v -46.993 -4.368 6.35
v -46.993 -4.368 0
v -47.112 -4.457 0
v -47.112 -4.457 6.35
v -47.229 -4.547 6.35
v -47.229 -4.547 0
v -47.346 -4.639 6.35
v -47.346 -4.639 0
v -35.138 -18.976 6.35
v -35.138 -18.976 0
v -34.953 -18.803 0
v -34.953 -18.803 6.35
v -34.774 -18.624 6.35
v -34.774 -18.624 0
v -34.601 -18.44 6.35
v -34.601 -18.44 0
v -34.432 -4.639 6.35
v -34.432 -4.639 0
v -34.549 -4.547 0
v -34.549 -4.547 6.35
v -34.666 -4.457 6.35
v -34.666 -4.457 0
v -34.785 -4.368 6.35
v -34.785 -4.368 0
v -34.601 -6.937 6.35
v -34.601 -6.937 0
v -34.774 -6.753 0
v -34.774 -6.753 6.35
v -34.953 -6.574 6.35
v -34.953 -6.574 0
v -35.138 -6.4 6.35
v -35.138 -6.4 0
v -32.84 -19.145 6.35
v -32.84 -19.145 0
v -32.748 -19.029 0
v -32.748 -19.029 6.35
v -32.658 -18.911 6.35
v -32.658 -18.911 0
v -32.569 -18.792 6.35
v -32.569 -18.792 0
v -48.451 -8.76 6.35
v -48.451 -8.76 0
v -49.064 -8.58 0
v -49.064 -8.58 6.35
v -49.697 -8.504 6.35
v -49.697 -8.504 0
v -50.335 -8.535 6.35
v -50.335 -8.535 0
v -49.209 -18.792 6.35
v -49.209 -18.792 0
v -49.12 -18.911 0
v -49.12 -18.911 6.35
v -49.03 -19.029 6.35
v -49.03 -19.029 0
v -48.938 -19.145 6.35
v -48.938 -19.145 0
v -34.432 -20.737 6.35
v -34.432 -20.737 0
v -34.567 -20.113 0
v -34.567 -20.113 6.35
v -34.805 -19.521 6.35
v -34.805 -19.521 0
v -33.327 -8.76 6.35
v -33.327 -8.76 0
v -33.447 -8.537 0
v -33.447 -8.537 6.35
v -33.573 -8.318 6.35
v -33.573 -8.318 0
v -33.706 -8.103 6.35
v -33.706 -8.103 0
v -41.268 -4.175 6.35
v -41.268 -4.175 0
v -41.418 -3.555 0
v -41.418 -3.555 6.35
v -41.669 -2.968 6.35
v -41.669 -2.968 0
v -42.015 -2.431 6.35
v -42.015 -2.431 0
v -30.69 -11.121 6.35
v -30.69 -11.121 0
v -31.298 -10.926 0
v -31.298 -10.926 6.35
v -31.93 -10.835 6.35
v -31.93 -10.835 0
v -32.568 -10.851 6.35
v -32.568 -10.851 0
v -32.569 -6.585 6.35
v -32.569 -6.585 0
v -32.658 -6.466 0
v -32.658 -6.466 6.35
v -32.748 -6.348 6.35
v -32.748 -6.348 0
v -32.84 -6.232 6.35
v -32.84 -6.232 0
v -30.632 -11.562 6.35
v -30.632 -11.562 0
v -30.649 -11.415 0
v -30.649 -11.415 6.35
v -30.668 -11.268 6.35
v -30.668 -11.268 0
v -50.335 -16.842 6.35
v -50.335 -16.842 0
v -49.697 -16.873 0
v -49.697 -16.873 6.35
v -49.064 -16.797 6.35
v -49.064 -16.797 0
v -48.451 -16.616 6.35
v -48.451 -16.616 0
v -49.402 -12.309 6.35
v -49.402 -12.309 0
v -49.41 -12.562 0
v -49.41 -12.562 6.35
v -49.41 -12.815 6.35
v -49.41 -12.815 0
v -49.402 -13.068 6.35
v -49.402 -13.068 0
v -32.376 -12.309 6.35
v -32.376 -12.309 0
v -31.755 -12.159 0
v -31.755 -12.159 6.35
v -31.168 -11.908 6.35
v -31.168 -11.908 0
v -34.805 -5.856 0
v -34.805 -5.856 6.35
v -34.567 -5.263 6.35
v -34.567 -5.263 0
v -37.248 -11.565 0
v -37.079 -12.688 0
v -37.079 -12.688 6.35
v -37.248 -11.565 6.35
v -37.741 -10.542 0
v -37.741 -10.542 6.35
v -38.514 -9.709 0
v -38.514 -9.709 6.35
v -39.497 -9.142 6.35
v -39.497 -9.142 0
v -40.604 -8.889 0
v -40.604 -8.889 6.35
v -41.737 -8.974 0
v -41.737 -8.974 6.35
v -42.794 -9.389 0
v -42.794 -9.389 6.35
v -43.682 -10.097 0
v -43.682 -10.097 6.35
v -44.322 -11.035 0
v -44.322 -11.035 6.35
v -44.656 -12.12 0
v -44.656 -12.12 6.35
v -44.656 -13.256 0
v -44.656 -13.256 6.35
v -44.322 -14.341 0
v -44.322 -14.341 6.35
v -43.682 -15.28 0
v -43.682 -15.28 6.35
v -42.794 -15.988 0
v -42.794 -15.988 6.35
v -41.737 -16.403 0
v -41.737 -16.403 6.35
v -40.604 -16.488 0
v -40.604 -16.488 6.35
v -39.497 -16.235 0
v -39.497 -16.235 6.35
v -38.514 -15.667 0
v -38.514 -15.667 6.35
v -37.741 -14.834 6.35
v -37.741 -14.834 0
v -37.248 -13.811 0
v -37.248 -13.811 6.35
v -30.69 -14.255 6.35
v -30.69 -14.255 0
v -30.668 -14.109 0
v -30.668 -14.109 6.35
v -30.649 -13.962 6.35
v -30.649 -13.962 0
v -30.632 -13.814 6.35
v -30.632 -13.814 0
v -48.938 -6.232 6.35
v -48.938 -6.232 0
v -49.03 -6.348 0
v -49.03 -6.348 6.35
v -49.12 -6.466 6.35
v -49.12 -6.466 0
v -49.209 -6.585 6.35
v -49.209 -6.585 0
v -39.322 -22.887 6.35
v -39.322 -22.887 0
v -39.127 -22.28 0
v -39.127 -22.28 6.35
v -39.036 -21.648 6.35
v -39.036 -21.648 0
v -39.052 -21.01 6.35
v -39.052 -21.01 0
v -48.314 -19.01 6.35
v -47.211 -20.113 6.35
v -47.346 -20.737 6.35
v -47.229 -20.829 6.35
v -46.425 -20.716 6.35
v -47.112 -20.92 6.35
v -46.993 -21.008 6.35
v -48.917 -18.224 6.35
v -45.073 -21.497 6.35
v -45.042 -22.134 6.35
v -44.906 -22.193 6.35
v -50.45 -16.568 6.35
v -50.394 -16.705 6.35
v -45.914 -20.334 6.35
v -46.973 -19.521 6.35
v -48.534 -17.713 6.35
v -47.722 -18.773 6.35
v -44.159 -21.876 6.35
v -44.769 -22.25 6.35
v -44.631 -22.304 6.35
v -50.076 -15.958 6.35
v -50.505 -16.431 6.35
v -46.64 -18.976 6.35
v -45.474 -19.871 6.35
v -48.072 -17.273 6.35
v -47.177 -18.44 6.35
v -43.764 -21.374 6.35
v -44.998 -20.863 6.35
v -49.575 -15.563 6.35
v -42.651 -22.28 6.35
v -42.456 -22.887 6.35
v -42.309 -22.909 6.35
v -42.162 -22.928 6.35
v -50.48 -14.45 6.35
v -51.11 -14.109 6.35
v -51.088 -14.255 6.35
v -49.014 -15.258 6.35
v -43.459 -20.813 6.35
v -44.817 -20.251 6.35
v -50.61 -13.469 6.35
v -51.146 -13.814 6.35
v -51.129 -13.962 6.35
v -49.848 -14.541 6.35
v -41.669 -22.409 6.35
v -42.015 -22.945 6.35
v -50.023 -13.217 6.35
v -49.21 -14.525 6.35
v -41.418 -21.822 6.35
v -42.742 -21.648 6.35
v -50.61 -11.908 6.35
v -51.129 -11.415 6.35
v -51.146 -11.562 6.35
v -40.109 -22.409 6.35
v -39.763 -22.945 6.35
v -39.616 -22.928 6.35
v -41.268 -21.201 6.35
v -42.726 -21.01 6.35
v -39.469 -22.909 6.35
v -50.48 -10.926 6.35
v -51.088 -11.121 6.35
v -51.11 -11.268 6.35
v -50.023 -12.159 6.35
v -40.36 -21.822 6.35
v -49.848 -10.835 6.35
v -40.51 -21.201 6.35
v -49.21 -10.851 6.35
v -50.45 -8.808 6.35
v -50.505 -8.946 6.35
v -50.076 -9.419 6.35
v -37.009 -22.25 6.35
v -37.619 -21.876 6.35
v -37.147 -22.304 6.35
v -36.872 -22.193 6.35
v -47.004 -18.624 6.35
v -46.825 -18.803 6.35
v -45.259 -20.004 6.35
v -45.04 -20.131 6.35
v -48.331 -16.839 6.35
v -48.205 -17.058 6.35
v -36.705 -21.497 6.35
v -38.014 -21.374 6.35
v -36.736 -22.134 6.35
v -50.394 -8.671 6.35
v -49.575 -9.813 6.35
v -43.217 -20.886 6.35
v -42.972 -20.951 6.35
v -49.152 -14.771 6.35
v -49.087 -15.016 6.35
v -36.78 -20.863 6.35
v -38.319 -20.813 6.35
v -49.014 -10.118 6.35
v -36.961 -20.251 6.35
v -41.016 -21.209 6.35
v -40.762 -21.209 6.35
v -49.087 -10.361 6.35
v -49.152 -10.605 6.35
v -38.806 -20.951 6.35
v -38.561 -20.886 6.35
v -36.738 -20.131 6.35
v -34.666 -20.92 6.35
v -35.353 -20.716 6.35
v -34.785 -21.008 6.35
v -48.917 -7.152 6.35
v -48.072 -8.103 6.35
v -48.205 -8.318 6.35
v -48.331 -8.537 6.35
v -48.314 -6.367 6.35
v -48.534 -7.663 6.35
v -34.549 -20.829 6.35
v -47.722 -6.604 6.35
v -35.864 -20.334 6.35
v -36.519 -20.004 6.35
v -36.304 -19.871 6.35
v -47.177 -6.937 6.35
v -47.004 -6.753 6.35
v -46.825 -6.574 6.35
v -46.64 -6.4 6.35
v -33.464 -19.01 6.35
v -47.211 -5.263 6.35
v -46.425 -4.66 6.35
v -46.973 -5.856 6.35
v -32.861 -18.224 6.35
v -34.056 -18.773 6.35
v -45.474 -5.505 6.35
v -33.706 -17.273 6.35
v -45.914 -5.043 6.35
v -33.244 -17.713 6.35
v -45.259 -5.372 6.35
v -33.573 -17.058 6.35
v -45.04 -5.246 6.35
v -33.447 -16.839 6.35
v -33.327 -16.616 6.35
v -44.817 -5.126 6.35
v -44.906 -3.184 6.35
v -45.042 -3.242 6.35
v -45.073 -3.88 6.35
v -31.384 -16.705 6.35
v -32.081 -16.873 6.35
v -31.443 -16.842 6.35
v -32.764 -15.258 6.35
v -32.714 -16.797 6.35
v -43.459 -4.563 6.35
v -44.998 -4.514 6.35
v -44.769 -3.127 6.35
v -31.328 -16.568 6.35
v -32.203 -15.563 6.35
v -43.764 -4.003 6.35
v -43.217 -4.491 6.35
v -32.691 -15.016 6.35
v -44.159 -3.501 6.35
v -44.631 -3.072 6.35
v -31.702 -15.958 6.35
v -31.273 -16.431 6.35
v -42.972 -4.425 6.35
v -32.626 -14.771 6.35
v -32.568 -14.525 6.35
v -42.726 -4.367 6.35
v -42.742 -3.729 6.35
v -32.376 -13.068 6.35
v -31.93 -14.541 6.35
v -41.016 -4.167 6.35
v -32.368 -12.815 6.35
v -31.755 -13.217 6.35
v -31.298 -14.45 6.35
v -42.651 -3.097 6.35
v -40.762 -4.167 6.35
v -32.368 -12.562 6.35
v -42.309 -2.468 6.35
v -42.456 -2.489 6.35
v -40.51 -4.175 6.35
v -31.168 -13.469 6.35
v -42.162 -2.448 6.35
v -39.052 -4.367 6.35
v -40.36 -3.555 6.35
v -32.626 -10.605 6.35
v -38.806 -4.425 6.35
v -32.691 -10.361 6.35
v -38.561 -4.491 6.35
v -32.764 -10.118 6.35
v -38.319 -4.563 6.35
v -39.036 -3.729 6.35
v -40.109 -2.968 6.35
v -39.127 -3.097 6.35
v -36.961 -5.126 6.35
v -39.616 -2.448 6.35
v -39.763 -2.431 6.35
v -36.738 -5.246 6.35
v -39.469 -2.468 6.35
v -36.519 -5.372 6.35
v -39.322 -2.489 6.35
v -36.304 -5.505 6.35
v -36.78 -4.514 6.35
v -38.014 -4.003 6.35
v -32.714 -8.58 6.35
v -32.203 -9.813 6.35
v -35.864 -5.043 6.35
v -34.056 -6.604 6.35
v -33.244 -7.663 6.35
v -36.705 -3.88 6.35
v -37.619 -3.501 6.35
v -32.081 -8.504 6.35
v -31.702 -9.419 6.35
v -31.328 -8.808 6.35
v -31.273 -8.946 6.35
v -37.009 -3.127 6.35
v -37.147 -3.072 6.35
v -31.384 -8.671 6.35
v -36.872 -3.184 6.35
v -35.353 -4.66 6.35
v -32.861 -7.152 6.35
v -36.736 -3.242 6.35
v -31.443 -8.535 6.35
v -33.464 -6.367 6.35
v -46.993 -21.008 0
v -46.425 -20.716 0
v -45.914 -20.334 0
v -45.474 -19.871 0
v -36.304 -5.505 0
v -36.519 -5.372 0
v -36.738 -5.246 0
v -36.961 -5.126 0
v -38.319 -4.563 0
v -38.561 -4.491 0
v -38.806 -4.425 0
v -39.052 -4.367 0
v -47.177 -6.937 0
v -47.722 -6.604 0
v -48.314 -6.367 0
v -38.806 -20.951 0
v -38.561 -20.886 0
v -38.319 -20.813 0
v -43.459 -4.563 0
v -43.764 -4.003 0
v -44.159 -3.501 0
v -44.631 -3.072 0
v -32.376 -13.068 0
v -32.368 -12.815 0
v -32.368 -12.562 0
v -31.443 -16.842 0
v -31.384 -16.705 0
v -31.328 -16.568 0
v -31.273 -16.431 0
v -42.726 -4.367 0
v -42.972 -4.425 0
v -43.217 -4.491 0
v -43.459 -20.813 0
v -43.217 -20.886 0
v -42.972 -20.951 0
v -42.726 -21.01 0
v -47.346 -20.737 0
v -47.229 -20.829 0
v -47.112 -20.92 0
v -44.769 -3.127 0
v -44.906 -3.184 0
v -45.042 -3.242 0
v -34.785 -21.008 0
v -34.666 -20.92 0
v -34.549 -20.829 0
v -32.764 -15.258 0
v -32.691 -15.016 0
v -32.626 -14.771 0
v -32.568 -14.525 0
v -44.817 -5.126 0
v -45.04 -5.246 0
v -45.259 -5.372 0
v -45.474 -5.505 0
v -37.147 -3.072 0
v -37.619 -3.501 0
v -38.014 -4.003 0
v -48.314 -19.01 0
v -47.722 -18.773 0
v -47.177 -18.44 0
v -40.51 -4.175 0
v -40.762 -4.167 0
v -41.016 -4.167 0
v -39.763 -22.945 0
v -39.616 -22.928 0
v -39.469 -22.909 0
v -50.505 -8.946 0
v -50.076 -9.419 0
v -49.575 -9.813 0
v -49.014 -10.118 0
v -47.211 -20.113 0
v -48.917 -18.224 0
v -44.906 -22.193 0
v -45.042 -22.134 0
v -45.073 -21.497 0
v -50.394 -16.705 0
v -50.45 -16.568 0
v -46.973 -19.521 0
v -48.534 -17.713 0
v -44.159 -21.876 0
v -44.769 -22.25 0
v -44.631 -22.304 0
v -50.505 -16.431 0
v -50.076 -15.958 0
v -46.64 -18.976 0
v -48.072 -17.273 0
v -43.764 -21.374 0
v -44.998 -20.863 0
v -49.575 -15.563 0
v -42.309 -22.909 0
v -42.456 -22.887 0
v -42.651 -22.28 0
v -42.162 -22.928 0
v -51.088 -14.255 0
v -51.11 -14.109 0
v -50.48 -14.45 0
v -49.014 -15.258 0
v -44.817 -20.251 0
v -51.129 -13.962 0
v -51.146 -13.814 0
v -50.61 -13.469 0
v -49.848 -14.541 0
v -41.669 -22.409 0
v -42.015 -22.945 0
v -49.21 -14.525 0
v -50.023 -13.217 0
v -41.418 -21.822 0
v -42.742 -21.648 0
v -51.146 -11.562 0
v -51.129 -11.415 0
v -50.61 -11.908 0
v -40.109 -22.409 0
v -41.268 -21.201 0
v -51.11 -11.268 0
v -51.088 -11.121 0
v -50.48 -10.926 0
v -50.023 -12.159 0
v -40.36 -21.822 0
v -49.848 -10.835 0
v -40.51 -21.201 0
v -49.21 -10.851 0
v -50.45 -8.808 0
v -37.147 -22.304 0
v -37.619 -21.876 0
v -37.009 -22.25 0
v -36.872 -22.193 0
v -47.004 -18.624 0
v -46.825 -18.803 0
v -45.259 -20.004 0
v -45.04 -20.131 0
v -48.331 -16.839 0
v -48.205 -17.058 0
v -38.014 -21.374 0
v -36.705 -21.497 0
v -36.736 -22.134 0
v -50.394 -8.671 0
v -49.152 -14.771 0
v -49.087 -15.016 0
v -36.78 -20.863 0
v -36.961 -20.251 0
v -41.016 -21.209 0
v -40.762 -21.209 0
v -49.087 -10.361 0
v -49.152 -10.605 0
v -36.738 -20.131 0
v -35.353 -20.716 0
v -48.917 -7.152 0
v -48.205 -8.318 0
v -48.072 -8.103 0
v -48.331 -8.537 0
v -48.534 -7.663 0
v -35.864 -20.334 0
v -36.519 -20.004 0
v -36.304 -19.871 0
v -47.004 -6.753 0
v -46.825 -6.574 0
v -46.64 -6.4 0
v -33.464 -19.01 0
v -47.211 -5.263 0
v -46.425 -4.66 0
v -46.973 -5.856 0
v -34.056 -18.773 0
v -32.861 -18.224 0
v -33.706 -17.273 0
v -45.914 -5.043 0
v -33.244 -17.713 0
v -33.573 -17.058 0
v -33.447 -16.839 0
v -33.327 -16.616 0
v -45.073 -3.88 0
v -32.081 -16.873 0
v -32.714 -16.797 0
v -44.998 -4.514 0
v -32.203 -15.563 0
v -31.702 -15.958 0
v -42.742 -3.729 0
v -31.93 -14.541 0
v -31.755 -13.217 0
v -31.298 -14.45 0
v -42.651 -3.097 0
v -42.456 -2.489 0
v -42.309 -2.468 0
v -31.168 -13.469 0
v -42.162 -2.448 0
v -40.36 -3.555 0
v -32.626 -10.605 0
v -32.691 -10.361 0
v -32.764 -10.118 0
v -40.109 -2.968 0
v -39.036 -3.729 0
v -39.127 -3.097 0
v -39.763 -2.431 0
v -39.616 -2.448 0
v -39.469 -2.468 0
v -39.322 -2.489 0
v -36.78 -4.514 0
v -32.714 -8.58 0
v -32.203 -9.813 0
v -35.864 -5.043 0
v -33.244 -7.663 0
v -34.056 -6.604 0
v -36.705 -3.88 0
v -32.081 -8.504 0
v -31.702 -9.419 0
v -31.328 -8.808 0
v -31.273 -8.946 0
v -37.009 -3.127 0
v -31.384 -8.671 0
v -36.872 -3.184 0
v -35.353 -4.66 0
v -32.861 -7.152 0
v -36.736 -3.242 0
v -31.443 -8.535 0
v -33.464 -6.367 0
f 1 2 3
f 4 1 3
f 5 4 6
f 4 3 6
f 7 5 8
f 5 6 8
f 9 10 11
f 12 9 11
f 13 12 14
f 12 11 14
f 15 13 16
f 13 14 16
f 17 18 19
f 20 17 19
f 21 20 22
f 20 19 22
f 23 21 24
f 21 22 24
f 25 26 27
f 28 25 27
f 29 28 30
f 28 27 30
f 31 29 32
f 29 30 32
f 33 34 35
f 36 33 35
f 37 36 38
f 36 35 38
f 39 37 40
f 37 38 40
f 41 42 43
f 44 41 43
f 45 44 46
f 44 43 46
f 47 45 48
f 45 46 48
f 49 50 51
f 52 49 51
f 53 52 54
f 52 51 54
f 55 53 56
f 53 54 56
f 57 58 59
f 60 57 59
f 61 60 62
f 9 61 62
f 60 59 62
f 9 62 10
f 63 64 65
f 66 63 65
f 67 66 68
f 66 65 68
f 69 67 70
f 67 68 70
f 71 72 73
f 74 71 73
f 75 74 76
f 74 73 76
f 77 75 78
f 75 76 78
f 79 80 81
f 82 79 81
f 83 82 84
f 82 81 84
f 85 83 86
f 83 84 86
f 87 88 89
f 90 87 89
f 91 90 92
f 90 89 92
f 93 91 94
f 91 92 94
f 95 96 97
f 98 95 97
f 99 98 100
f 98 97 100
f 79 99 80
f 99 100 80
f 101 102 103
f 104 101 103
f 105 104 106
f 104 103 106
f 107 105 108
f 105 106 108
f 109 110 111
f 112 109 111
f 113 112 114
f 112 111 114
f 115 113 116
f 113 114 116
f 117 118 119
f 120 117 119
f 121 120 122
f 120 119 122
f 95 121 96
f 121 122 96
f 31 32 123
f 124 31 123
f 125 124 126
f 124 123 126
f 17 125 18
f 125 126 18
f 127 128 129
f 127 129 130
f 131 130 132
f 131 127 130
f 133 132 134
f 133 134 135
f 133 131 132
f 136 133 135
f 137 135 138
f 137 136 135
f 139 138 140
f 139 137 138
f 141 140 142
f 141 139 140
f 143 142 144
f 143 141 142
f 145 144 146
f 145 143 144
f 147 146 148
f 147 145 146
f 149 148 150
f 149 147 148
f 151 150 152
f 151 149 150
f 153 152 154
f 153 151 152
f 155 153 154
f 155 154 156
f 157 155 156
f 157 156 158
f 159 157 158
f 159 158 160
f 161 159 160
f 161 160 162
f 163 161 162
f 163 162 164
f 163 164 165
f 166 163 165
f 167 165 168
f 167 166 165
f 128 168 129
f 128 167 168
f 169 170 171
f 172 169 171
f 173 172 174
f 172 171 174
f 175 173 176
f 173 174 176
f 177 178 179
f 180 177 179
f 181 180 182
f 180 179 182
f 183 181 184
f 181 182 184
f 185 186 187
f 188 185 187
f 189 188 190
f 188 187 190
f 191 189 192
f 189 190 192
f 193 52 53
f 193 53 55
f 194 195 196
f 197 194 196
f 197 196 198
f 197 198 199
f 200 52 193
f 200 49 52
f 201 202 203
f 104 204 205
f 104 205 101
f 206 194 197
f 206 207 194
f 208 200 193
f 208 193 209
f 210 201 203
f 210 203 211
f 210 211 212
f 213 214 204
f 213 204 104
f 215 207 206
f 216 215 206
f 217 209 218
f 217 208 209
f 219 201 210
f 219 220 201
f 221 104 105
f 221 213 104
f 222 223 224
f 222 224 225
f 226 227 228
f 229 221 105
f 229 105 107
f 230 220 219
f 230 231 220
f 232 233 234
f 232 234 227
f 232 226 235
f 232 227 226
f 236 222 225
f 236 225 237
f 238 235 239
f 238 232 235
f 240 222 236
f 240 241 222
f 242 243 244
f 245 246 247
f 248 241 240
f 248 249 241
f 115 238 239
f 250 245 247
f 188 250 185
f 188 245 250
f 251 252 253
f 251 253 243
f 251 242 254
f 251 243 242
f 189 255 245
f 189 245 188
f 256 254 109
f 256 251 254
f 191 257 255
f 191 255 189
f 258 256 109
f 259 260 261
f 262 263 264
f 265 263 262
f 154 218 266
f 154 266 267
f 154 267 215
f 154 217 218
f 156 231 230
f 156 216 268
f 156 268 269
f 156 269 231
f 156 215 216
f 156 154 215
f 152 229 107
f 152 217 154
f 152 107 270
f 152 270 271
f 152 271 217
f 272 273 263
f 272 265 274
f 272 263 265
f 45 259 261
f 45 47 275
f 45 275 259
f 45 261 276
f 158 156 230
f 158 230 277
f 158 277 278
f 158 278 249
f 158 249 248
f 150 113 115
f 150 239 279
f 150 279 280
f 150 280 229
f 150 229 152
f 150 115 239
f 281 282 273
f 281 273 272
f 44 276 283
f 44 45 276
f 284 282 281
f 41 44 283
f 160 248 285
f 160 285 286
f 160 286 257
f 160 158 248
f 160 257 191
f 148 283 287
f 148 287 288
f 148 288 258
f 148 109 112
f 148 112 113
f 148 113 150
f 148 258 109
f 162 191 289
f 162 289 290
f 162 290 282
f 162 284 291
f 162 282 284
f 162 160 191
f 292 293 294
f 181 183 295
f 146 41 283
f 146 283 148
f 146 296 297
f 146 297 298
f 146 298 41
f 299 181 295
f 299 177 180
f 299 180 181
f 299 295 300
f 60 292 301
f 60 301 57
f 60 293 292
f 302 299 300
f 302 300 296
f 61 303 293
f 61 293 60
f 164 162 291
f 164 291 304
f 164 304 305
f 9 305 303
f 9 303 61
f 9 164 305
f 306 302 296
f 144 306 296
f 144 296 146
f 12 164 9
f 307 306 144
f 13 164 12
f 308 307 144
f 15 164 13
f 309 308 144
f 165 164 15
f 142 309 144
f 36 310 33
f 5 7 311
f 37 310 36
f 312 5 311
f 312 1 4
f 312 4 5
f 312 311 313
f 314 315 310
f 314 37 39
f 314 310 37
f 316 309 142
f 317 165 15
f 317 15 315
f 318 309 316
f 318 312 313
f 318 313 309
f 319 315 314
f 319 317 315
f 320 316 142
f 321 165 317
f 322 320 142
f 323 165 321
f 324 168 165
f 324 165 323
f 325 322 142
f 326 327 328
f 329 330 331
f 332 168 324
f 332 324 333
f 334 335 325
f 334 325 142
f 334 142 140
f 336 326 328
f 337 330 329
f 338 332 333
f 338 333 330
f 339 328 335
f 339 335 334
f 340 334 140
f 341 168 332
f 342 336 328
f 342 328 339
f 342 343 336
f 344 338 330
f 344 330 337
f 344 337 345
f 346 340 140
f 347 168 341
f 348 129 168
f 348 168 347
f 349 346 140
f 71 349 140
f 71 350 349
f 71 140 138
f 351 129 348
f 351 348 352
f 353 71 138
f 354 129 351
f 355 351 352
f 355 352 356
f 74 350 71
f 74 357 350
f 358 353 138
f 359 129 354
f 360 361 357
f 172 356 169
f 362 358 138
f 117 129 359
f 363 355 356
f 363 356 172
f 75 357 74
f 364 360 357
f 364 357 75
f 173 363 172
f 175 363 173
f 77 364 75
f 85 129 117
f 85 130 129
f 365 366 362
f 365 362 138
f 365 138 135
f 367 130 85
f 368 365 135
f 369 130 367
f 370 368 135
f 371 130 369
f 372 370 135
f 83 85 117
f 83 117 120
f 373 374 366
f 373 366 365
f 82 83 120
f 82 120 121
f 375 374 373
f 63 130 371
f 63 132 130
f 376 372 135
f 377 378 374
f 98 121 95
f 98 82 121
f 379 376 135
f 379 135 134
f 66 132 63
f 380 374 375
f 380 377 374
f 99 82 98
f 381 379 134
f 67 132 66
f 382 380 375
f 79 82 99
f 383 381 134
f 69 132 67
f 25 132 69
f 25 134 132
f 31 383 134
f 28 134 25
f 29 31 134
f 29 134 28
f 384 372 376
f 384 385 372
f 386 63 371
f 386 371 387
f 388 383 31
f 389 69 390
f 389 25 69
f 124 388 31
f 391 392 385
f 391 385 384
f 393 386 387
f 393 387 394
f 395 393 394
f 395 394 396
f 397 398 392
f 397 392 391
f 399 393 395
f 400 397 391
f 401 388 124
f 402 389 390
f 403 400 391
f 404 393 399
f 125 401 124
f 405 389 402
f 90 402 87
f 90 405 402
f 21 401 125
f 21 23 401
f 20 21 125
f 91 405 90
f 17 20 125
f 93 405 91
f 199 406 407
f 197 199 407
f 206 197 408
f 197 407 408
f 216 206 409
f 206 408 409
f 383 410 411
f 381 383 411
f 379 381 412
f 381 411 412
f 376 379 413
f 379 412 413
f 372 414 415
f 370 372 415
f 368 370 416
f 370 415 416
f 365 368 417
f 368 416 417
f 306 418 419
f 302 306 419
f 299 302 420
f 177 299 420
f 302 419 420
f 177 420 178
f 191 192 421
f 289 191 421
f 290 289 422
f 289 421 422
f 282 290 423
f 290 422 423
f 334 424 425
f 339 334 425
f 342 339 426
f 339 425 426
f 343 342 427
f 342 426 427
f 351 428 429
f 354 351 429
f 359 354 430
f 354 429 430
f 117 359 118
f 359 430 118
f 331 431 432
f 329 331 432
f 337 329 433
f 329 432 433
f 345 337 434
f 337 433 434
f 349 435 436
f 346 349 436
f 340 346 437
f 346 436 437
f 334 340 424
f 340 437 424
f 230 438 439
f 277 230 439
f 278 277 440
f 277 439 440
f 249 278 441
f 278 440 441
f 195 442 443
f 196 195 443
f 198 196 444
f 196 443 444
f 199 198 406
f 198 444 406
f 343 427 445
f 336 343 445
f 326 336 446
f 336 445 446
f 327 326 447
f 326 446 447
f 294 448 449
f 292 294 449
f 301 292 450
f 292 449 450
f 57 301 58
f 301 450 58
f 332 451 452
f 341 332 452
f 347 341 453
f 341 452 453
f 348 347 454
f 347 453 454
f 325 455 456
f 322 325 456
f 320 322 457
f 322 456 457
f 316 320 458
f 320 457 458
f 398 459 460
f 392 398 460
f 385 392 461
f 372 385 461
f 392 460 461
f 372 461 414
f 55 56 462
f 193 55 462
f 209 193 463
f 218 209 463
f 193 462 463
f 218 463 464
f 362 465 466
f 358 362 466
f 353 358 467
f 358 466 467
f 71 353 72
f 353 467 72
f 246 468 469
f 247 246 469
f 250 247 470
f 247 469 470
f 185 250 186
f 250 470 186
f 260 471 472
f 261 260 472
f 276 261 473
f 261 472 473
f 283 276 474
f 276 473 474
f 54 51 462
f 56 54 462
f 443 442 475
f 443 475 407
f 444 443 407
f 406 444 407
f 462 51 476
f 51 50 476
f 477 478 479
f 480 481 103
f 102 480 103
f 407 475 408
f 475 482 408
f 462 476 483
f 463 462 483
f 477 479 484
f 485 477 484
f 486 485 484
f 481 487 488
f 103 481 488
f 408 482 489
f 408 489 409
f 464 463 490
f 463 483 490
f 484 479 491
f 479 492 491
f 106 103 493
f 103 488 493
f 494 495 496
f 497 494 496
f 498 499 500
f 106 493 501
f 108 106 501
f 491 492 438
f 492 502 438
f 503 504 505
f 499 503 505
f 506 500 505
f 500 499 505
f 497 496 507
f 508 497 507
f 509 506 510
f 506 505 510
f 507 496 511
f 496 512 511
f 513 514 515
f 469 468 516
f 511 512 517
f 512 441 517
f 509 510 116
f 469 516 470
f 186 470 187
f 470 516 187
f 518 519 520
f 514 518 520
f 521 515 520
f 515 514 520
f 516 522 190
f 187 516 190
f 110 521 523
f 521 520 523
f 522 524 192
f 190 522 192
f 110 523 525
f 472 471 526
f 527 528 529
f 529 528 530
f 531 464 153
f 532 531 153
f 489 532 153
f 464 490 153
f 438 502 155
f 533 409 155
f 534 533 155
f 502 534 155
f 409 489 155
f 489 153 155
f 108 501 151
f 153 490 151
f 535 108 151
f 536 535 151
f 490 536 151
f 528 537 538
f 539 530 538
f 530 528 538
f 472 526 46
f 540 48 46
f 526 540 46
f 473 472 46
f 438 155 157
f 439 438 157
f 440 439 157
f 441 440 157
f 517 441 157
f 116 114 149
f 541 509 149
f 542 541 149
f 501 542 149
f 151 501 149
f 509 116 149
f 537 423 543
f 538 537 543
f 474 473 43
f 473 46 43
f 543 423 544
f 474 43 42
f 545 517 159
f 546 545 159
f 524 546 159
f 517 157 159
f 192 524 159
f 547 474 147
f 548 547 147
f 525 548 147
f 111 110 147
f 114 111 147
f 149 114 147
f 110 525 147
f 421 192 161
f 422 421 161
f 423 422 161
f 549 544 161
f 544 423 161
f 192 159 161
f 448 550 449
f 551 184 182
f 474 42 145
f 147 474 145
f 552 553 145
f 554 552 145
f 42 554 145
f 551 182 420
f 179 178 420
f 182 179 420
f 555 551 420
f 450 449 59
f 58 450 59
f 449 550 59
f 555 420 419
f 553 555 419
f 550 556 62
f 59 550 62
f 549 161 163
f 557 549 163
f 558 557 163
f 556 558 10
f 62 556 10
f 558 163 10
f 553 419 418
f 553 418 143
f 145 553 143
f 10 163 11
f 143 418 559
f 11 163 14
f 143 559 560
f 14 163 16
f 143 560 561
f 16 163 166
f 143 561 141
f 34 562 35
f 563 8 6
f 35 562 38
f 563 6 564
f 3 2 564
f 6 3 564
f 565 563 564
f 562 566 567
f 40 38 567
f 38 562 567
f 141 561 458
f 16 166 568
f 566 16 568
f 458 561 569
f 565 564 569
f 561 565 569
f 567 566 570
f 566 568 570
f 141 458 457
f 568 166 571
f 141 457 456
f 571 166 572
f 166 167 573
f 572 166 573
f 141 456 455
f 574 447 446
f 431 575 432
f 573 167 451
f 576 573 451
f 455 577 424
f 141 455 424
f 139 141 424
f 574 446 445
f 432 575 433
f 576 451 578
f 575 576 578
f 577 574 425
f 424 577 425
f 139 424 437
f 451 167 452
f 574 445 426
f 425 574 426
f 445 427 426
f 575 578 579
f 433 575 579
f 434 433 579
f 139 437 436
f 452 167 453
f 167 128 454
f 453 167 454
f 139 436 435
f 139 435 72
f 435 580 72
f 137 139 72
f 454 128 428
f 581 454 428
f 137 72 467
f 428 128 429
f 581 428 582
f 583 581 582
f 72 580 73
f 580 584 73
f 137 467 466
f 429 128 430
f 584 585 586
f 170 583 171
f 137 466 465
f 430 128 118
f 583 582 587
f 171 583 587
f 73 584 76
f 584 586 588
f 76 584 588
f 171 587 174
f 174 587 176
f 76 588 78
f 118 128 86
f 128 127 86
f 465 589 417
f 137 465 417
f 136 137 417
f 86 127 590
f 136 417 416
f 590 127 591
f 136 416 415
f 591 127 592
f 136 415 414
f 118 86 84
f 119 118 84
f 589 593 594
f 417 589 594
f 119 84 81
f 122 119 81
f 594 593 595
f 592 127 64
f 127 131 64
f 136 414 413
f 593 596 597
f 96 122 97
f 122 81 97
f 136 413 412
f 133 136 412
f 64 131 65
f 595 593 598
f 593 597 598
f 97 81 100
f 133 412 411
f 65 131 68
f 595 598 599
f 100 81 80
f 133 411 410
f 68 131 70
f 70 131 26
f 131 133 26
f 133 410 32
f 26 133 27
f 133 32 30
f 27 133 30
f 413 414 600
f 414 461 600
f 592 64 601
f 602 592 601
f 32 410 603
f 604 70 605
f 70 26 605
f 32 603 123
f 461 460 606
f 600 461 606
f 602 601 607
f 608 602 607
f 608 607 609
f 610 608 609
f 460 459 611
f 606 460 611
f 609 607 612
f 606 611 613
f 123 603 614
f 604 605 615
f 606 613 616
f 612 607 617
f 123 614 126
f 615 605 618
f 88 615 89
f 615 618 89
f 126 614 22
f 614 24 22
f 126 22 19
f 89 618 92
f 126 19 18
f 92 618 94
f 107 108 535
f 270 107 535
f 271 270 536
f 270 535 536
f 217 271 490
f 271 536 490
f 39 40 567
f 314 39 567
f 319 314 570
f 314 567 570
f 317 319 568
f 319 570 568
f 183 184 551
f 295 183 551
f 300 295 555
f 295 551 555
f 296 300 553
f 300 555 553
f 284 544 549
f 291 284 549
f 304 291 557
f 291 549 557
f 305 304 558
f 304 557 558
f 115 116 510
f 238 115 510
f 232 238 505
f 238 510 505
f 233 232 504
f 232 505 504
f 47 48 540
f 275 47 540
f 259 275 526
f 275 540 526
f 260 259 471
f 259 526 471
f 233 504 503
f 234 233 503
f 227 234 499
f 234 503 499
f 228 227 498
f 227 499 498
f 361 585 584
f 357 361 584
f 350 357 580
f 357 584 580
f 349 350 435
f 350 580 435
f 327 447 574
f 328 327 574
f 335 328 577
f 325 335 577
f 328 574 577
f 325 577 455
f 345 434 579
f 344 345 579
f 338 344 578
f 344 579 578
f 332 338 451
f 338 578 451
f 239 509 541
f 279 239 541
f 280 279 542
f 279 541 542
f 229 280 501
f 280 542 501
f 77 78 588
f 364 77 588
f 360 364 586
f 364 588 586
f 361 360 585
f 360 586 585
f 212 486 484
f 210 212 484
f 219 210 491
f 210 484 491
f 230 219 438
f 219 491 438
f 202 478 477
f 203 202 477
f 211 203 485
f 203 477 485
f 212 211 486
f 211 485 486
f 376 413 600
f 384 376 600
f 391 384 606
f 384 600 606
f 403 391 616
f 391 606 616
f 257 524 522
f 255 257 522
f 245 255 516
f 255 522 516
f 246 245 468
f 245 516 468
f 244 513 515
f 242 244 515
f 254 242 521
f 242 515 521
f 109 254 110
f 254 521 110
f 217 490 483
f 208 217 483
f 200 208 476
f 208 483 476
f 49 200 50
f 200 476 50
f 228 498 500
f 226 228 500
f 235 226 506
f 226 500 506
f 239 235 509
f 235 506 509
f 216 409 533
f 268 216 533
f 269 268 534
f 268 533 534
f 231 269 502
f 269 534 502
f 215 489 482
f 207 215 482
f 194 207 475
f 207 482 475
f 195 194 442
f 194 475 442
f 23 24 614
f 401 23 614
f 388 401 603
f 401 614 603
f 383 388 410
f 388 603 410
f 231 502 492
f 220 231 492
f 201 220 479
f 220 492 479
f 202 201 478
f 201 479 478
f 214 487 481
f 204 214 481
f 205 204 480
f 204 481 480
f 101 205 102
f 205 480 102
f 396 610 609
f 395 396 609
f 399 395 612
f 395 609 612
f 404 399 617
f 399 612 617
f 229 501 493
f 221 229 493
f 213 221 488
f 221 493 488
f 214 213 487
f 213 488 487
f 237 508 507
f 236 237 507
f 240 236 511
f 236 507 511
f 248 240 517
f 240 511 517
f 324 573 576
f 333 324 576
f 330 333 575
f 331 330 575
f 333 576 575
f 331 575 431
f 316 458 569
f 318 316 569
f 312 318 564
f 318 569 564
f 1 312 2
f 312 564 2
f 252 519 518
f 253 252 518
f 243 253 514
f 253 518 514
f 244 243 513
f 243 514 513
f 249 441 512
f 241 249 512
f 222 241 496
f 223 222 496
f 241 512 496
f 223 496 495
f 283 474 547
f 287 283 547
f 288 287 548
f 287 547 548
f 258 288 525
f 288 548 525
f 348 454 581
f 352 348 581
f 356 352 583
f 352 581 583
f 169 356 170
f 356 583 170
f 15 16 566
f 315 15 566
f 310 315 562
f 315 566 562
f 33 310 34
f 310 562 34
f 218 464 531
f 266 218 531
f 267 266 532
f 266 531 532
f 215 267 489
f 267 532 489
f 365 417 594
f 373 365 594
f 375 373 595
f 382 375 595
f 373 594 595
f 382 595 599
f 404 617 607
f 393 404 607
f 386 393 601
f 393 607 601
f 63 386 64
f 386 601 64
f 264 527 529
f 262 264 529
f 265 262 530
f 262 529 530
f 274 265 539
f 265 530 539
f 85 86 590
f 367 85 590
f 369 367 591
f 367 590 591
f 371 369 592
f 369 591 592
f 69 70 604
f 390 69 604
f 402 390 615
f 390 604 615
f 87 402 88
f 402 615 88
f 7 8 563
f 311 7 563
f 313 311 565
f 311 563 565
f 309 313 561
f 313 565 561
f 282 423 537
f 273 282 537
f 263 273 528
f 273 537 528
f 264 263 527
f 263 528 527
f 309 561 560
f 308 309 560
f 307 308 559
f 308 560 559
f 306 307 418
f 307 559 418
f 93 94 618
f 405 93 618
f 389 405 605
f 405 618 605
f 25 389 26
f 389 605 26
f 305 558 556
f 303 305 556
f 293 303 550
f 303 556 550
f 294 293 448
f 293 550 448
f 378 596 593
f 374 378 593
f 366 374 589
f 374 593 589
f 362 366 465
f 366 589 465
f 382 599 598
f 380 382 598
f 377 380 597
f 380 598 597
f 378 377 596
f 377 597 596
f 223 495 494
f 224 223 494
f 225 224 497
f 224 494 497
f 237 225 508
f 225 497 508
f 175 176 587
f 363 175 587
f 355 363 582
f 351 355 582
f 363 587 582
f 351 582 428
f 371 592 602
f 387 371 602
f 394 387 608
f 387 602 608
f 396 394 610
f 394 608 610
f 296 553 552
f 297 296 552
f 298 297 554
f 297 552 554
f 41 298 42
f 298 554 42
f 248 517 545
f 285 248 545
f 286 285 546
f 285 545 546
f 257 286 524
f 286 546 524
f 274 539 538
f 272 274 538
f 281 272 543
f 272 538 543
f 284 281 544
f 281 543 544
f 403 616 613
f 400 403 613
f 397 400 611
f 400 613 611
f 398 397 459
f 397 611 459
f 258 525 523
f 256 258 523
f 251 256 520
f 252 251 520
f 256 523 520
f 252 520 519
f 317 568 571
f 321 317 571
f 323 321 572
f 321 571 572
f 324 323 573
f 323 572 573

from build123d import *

# Parameters (mm, degrees)
SKETCH2_R           = 3.81
BOSS_EXTRUDE1_DEPTH = 6.35


with BuildPart() as part:
    # Sketch2 → Boss-Extrude1 (new body)
    with BuildSketch(Plane.XY):
        with BuildLine():
            ThreePointArc((-42.015017319, -22.945367918), (-41.531469039, -22.120633406), (-41.268457962, -21.20148645))
            ThreePointArc((-41.268457962, -21.20148645), (-40.889005651, -21.209938725), (-40.50955334, -21.20148645))
            ThreePointArc((-40.50955334, -21.20148645), (-40.246542262, -22.120633406), (-39.762993983, -22.945367918))
            ThreePointArc((-39.762993983, -22.945367918), (-39.542138505, -22.918710388), (-39.321909019, -22.887297981))
            ThreePointArc((-39.321909019, -22.887297981), (-39.068294246, -21.965514112), (-39.052137791, -21.009614053))
            ThreePointArc((-39.052137791, -21.009614053), (-38.683427394, -20.919568839), (-38.319092217, -20.813195084))
            ThreePointArc((-38.319092217, -20.813195084), (-37.827150287, -21.632950591), (-37.146621516, -22.304431452))
            ThreePointArc((-37.146621516, -22.304431452), (-36.940190983, -22.221520651), (-36.735595764, -22.13417901))
            ThreePointArc((-36.735595764, -22.13417901), (-36.729197926, -21.178163832), (-36.960997129, -20.250653679))
            ThreePointArc((-36.960997129, -20.250653679), (-36.628155651, -20.068247408), (-36.303766447, -19.871201369))
            ThreePointArc((-36.303766447, -19.871201369), (-35.616418695, -20.535700443), (-34.785286345, -21.008167342))
            ThreePointArc((-34.785286345, -21.008167342), (-34.607348655, -20.874653505), (-34.432330529, -20.737334819))
            ThreePointArc((-34.432330529, -20.737334819), (-34.673585627, -19.812239186), (-35.137543756, -18.976327224))
            ThreePointArc((-35.137543756, -18.976327224), (-34.863253794, -18.713990582), (-34.600917152, -18.43970062))
            ThreePointArc((-34.600917152, -18.43970062), (-33.76500519, -18.903658748), (-32.839909556, -19.144913847))
            ThreePointArc((-32.839909556, -19.144913847), (-32.702590871, -18.969895721), (-32.569077034, -18.791958031))
            ThreePointArc((-32.569077034, -18.791958031), (-33.041543932, -17.960825681), (-33.706043007, -17.273477928))
            ThreePointArc((-33.706043007, -17.273477928), (-33.508996967, -16.949088725), (-33.326590697, -16.616247247))
            ThreePointArc((-33.326590697, -16.616247247), (-32.399080544, -16.84804645), (-31.443065365, -16.841648612))
            ThreePointArc((-31.443065365, -16.841648612), (-31.355723725, -16.637053393), (-31.272812924, -16.430622859))
            ThreePointArc((-31.272812924, -16.430622859), (-31.944293785, -15.750094089), (-32.764049292, -15.258152159))
            ThreePointArc((-32.764049292, -15.258152159), (-32.657675537, -14.893816982), (-32.567630323, -14.525106585))
            ThreePointArc((-32.567630323, -14.525106585), (-31.611730264, -14.50895013), (-30.689946395, -14.255335357))
            ThreePointArc((-30.689946395, -14.255335357), (-30.658533987, -14.035105871), (-30.631876458, -13.814250393))
            ThreePointArc((-30.631876458, -13.814250393), (-31.456610969, -13.330702114), (-32.375757925, -13.067691036))
            ThreePointArc((-32.375757925, -13.067691036), (-32.367305651, -12.688238725), (-32.375757925, -12.308786414))
            ThreePointArc((-32.375757925, -12.308786414), (-31.456610969, -12.045775337), (-30.631876458, -11.562227057))
            ThreePointArc((-30.631876458, -11.562227057), (-30.658533987, -11.341371579), (-30.689946395, -11.121142093))
            ThreePointArc((-30.689946395, -11.121142093), (-31.611730264, -10.86752732), (-32.567630323, -10.851370865))
            ThreePointArc((-32.567630323, -10.851370865), (-32.657675537, -10.482660468), (-32.764049292, -10.118325291))
            ThreePointArc((-32.764049292, -10.118325291), (-31.944293785, -9.626383361), (-31.272812924, -8.945854591))
            ThreePointArc((-31.272812924, -8.945854591), (-31.355723725, -8.739424057), (-31.443065365, -8.534828838))
            ThreePointArc((-31.443065365, -8.534828838), (-32.399080544, -8.528431), (-33.326590697, -8.760230203))
            ThreePointArc((-33.326590697, -8.760230203), (-33.508996967, -8.427388725), (-33.706043007, -8.102999522))
            ThreePointArc((-33.706043007, -8.102999522), (-33.041543932, -7.415651769), (-32.569077034, -6.584519419))
            ThreePointArc((-32.569077034, -6.584519419), (-32.702590871, -6.406581729), (-32.839909556, -6.231563603))
            ThreePointArc((-32.839909556, -6.231563603), (-33.76500519, -6.472818702), (-34.600917152, -6.936776831))
            ThreePointArc((-34.600917152, -6.936776831), (-34.863253794, -6.662486868), (-35.137543756, -6.400150226))
            ThreePointArc((-35.137543756, -6.400150226), (-34.673585627, -5.564238264), (-34.432330529, -4.639142631))
            ThreePointArc((-34.432330529, -4.639142631), (-34.607348655, -4.501823945), (-34.785286345, -4.368310108))
            ThreePointArc((-34.785286345, -4.368310108), (-35.616418695, -4.840777007), (-36.303766447, -5.505276082))
            ThreePointArc((-36.303766447, -5.505276082), (-36.628155651, -5.308230042), (-36.960997129, -5.125823771))
            ThreePointArc((-36.960997129, -5.125823771), (-36.729197926, -4.198313618), (-36.735595764, -3.24229844))
            ThreePointArc((-36.735595764, -3.24229844), (-36.940190983, -3.154956799), (-37.146621516, -3.072045999))
            ThreePointArc((-37.146621516, -3.072045999), (-37.827150287, -3.743526859), (-38.319092217, -4.563282366))
            ThreePointArc((-38.319092217, -4.563282366), (-38.683427394, -4.456908611), (-39.052137791, -4.366863397))
            ThreePointArc((-39.052137791, -4.366863397), (-39.068294246, -3.410963338), (-39.321909019, -2.489179469))
            ThreePointArc((-39.321909019, -2.489179469), (-39.542138505, -2.457767062), (-39.762993983, -2.431109532))
            ThreePointArc((-39.762993983, -2.431109532), (-40.246542262, -3.255844044), (-40.50955334, -4.174991))
            ThreePointArc((-40.50955334, -4.174991), (-40.889005651, -4.166538725), (-41.268457962, -4.174991))
            ThreePointArc((-41.268457962, -4.174991), (-41.531469039, -3.255844044), (-42.015017319, -2.431109532))
            ThreePointArc((-42.015017319, -2.431109532), (-42.235872797, -2.457767062), (-42.456102283, -2.489179469))
            ThreePointArc((-42.456102283, -2.489179469), (-42.709717056, -3.410963338), (-42.725873511, -4.366863397))
            ThreePointArc((-42.725873511, -4.366863397), (-43.094583907, -4.456908611), (-43.458919085, -4.563282366))
            ThreePointArc((-43.458919085, -4.563282366), (-43.950861015, -3.743526859), (-44.631389785, -3.072045999))
            ThreePointArc((-44.631389785, -3.072045999), (-44.837820319, -3.154956799), (-45.042415538, -3.24229844))
            ThreePointArc((-45.042415538, -3.24229844), (-45.048813376, -4.198313618), (-44.817014173, -5.125823771))
            ThreePointArc((-44.817014173, -5.125823771), (-45.149855651, -5.308230042), (-45.474244854, -5.505276082))
            ThreePointArc((-45.474244854, -5.505276082), (-46.161592607, -4.840777007), (-46.992724957, -4.368310108))
            ThreePointArc((-46.992724957, -4.368310108), (-47.170662646, -4.501823945), (-47.345680772, -4.639142631))
            ThreePointArc((-47.345680772, -4.639142631), (-47.104425674, -5.564238264), (-46.640467545, -6.400150226))
            ThreePointArc((-46.640467545, -6.400150226), (-46.914757508, -6.662486868), (-47.177094149, -6.936776831))
            ThreePointArc((-47.177094149, -6.936776831), (-48.013006112, -6.472818702), (-48.938101745, -6.231563603))
            ThreePointArc((-48.938101745, -6.231563603), (-49.075420431, -6.406581729), (-49.208934268, -6.584519419))
            ThreePointArc((-49.208934268, -6.584519419), (-48.736467369, -7.415651769), (-48.071968294, -8.102999522))
            ThreePointArc((-48.071968294, -8.102999522), (-48.269014334, -8.427388725), (-48.451420605, -8.760230203))
            ThreePointArc((-48.451420605, -8.760230203), (-49.378930758, -8.528431), (-50.334945936, -8.534828838))
            ThreePointArc((-50.334945936, -8.534828838), (-50.422287577, -8.739424057), (-50.505198377, -8.945854591))
            ThreePointArc((-50.505198377, -8.945854591), (-49.833717517, -9.626383361), (-49.01396201, -10.118325291))
            ThreePointArc((-49.01396201, -10.118325291), (-49.120335765, -10.482660468), (-49.210380979, -10.851370865))
            ThreePointArc((-49.210380979, -10.851370865), (-50.166281038, -10.86752732), (-51.088064907, -11.121142093))
            ThreePointArc((-51.088064907, -11.121142093), (-51.119477314, -11.341371579), (-51.146134844, -11.562227057))
            ThreePointArc((-51.146134844, -11.562227057), (-50.321400332, -12.045775337), (-49.402253376, -12.308786414))
            ThreePointArc((-49.402253376, -12.308786414), (-49.410705651, -12.688238725), (-49.402253376, -13.067691036))
            ThreePointArc((-49.402253376, -13.067691036), (-50.321400332, -13.330702114), (-51.146134844, -13.814250393))
            ThreePointArc((-51.146134844, -13.814250393), (-51.119477314, -14.035105871), (-51.088064907, -14.255335357))
            ThreePointArc((-51.088064907, -14.255335357), (-50.166281038, -14.50895013), (-49.210380979, -14.525106585))
            ThreePointArc((-49.210380979, -14.525106585), (-49.120335765, -14.893816982), (-49.01396201, -15.258152159))
            ThreePointArc((-49.01396201, -15.258152159), (-49.833717517, -15.750094089), (-50.505198377, -16.430622859))
            ThreePointArc((-50.505198377, -16.430622859), (-50.422287577, -16.637053393), (-50.334945936, -16.841648612))
            ThreePointArc((-50.334945936, -16.841648612), (-49.378930758, -16.84804645), (-48.451420605, -16.616247247))
            ThreePointArc((-48.451420605, -16.616247247), (-48.269014334, -16.949088725), (-48.071968294, -17.273477928))
            ThreePointArc((-48.071968294, -17.273477928), (-48.736467369, -17.960825681), (-49.208934268, -18.791958031))
            ThreePointArc((-49.208934268, -18.791958031), (-49.075420431, -18.969895721), (-48.938101745, -19.144913847))
            ThreePointArc((-48.938101745, -19.144913847), (-48.013006112, -18.903658748), (-47.177094149, -18.43970062))
            ThreePointArc((-47.177094149, -18.43970062), (-46.914757508, -18.713990582), (-46.640467545, -18.976327224))
            ThreePointArc((-46.640467545, -18.976327224), (-47.104425674, -19.812239186), (-47.345680772, -20.737334819))
            ThreePointArc((-47.345680772, -20.737334819), (-47.170662646, -20.874653505), (-46.992724957, -21.008167342))
            ThreePointArc((-46.992724957, -21.008167342), (-46.161592607, -20.535700443), (-45.474244854, -19.871201369))
            ThreePointArc((-45.474244854, -19.871201369), (-45.149855651, -20.068247408), (-44.817014173, -20.250653679))
            ThreePointArc((-44.817014173, -20.250653679), (-45.048813376, -21.178163832), (-45.042415538, -22.13417901))
            ThreePointArc((-45.042415538, -22.13417901), (-44.837820319, -22.221520651), (-44.631389785, -22.304431452))
            ThreePointArc((-44.631389785, -22.304431452), (-43.950861015, -21.632950591), (-43.458919085, -20.813195084))
            ThreePointArc((-43.458919085, -20.813195084), (-43.094583907, -20.919568839), (-42.725873511, -21.009614053))
            ThreePointArc((-42.725873511, -21.009614053), (-42.709717056, -21.965514112), (-42.456102283, -22.887297981))
            ThreePointArc((-42.456102283, -22.887297981), (-42.235872797, -22.918710388), (-42.015017319, -22.945367918))
        make_face()
        with Locations((-40.889005651, -12.688238725)):
            Circle(SKETCH2_R, mode=Mode.SUBTRACT)
    extrude(amount=BOSS_EXTRUDE1_DEPTH)


solid = part.part
